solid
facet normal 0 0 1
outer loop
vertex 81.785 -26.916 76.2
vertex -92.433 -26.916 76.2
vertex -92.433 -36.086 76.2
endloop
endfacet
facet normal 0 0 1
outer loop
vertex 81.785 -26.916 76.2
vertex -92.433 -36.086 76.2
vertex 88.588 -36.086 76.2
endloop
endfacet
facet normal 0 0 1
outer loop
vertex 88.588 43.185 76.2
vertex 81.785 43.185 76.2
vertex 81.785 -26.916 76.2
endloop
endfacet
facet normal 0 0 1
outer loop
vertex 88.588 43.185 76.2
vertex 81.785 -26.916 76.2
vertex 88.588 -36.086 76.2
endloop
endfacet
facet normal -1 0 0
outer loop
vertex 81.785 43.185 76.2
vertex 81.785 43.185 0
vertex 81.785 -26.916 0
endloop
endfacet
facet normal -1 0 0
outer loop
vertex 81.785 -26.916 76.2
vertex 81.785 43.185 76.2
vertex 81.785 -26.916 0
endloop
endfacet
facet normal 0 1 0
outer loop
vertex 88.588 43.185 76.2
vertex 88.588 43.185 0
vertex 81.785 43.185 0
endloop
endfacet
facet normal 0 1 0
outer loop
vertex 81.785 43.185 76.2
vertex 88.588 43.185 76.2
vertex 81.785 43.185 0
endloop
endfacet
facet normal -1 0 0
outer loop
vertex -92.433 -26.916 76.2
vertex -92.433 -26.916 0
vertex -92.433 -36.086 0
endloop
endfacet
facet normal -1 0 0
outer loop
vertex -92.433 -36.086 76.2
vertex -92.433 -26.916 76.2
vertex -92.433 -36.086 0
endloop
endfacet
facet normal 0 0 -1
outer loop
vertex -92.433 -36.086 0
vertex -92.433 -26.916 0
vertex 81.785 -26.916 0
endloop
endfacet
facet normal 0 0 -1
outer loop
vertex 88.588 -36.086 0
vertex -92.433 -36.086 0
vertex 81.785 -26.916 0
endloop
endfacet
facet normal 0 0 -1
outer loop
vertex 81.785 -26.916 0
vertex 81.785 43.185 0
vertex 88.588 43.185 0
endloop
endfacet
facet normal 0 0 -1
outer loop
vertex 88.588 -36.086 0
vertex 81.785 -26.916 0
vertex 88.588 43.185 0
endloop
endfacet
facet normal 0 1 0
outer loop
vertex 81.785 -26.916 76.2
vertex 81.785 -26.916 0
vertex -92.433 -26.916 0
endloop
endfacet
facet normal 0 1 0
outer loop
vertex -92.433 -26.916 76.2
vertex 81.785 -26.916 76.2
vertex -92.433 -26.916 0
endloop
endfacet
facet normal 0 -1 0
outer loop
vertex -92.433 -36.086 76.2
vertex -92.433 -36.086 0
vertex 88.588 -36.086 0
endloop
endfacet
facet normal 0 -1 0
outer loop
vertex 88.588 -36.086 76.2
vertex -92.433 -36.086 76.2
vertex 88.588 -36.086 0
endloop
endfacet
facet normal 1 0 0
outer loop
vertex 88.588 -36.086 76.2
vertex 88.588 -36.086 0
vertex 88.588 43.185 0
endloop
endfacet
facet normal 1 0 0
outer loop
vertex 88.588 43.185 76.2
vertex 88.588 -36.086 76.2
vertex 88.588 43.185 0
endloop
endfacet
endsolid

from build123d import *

# Parameters (mm, degrees)
F2_DEPTH = 76.2
F3_DEPTH = 76.2


# Not quite as in the source:
# - the program builds the solid bodies; features that only make, move or delete a surface that nothing else refers to are left out


with BuildPart() as f2:
    # F0 (on Top) → F2 (new body)
    with BuildSketch(Plane.XY):
        Polygon((88.587783277, 43.1846939027), (81.7847177386, 43.1846939027), (81.7847177386, -26.9164871424), (-92.4329981208, -26.9164871424), (-92.4329981208, -36.0858403146), (88.587783277, -36.0858403146), align=None)
    extrude(amount=F2_DEPTH)

    # F0 (on Top) → F3 (join)
    with BuildSketch(Plane.XY):
        Polygon((88.587783277, 43.1846939027), (81.7847177386, 43.1846939027), (81.7847177386, -26.9164871424), (-92.4329981208, -26.9164871424), (-92.4329981208, -36.0858403146), (88.587783277, -36.0858403146), align=None)
    extrude(amount=F3_DEPTH)


solid = f2.part
